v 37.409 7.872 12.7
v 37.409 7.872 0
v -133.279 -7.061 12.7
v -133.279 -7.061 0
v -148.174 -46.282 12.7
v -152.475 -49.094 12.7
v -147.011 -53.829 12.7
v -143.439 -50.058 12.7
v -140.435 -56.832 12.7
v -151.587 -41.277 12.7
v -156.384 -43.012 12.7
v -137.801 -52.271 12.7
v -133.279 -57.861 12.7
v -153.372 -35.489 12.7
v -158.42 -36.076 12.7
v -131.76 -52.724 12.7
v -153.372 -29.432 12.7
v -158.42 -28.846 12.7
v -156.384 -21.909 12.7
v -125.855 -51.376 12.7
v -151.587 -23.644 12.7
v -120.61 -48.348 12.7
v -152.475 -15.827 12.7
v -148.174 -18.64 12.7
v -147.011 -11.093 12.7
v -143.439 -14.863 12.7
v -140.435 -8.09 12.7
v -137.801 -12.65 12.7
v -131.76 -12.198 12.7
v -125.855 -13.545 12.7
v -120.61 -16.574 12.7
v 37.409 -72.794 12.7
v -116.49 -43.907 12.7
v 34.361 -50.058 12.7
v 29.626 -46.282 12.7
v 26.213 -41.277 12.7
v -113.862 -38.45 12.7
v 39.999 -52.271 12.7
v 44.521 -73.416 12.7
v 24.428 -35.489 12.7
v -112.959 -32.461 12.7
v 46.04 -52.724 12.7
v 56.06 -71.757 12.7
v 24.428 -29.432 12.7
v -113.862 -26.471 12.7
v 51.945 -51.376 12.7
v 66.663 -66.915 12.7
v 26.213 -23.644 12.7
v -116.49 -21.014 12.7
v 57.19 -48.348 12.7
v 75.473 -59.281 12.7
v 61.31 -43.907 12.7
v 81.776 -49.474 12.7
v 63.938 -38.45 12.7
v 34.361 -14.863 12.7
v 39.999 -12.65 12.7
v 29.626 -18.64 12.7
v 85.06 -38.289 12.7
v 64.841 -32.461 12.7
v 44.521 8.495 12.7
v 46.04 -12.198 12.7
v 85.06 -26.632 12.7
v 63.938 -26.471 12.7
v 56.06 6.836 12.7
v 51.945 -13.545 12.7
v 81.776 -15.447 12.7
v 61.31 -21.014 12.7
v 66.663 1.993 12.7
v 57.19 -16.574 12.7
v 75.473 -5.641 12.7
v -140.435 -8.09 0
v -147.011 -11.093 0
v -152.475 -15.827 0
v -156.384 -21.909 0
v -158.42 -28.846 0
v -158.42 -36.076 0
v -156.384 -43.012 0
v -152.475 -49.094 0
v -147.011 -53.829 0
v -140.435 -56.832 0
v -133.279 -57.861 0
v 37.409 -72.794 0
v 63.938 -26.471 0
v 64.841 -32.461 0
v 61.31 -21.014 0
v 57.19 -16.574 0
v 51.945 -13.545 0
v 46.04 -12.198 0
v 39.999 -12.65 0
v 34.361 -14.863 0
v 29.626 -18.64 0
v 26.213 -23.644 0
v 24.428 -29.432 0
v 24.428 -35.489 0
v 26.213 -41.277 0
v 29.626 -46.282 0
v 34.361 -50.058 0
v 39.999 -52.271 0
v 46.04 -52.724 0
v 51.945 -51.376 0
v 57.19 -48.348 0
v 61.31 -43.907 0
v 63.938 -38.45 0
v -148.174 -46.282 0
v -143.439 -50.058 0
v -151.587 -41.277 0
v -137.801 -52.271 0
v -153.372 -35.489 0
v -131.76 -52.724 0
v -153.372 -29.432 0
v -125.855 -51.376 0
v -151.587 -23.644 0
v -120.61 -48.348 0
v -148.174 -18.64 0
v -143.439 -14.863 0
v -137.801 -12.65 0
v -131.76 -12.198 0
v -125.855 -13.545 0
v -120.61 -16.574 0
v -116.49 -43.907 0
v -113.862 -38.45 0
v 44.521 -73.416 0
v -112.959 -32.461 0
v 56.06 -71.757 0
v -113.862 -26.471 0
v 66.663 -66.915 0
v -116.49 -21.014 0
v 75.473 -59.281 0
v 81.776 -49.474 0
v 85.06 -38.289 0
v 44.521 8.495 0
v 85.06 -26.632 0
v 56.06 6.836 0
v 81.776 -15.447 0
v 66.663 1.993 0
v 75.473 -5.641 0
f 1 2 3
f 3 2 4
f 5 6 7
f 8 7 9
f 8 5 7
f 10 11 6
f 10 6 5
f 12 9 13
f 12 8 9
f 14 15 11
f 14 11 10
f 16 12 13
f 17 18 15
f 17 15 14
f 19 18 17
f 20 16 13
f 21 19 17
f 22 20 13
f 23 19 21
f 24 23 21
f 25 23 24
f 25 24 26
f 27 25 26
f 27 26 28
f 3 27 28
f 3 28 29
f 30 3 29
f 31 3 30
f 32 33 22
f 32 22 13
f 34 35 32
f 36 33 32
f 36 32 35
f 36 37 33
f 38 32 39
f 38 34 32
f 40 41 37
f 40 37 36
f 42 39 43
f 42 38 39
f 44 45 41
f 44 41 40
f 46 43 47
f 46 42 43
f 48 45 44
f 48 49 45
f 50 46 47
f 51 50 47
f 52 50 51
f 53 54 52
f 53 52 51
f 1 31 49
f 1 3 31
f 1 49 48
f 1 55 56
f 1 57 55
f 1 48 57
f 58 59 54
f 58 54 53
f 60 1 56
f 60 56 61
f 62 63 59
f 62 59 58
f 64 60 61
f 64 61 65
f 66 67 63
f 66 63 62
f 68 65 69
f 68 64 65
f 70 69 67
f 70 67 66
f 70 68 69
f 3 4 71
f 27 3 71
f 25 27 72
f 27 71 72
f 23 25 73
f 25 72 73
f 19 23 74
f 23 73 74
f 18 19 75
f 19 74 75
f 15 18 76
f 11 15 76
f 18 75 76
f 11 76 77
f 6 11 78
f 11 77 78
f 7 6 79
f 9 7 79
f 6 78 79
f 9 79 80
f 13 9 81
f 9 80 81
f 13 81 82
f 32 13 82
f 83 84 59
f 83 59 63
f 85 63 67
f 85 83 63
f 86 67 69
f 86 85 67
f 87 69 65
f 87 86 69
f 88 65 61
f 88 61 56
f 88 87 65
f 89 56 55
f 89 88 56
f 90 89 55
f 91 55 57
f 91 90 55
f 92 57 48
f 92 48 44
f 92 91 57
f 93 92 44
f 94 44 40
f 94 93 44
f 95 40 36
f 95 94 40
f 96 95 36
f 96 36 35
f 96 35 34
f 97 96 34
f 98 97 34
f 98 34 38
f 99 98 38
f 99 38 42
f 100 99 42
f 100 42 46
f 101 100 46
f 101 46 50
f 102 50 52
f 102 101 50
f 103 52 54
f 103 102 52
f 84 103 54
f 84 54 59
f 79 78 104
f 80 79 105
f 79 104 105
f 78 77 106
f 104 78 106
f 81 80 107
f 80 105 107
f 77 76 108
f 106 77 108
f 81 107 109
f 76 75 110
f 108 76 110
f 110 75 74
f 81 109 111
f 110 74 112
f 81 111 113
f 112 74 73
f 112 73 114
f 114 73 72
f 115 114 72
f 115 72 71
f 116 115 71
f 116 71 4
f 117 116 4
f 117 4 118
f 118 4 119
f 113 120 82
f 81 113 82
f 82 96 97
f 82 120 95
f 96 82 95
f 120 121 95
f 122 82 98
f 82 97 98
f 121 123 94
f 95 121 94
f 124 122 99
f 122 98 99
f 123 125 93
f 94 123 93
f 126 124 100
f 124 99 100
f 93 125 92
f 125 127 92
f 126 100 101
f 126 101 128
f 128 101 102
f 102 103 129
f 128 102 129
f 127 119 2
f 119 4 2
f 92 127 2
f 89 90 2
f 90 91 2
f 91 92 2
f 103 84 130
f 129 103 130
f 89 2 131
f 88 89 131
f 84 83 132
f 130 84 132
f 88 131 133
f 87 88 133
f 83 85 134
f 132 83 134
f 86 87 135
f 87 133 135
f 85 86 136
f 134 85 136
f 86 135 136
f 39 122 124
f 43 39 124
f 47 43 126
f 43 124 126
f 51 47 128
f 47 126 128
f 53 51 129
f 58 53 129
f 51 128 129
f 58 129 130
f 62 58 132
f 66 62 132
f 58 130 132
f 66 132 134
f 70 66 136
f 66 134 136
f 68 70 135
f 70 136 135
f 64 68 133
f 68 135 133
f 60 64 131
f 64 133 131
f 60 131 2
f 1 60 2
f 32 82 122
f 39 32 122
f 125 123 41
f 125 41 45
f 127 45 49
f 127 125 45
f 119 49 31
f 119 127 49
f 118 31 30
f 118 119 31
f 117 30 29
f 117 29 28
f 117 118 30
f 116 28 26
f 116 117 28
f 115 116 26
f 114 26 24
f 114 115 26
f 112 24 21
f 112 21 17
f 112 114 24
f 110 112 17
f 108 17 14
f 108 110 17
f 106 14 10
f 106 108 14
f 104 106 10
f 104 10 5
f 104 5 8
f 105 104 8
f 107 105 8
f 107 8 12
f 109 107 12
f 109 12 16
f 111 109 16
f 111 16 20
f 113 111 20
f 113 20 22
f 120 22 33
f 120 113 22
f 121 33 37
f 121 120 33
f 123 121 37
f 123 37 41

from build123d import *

# Parameters (mm, degrees)
SKETCH1_R           = 20.32
BOSS_EXTRUDE1_DEPTH = 12.7


with BuildPart() as part:
    # Sketch1 → Boss-Extrude1 (new body)
    with BuildSketch(Plane.XY):
        with BuildLine():
            Line((37.409275597, 7.872494736), (-133.278879175, -7.060783805))
            ThreePointArc((-133.278879175, -7.060783805), (-158.678879175, -32.460783805), (-133.278879175, -57.860783805))
            Line((-133.278879175, -57.860783805), (37.409275597, -72.794062346))
            Line((37.409275597, -72.794062346), (44.521120825, -73.41626818))
            ThreePointArc((44.521120825, -73.41626818), (85.476605199, -32.460783805), (44.521120825, 8.49470057))
            Line((44.521120825, 8.49470057), (37.409275597, 7.872494736))
        make_face()
        with Locations((-133.278879175, -32.460783805)):
            Circle(SKETCH1_R, mode=Mode.SUBTRACT)
        with Locations((44.521120825, -32.460783805)):
            Circle(SKETCH1_R, mode=Mode.SUBTRACT)
    extrude(amount=BOSS_EXTRUDE1_DEPTH)


solid = part.part
